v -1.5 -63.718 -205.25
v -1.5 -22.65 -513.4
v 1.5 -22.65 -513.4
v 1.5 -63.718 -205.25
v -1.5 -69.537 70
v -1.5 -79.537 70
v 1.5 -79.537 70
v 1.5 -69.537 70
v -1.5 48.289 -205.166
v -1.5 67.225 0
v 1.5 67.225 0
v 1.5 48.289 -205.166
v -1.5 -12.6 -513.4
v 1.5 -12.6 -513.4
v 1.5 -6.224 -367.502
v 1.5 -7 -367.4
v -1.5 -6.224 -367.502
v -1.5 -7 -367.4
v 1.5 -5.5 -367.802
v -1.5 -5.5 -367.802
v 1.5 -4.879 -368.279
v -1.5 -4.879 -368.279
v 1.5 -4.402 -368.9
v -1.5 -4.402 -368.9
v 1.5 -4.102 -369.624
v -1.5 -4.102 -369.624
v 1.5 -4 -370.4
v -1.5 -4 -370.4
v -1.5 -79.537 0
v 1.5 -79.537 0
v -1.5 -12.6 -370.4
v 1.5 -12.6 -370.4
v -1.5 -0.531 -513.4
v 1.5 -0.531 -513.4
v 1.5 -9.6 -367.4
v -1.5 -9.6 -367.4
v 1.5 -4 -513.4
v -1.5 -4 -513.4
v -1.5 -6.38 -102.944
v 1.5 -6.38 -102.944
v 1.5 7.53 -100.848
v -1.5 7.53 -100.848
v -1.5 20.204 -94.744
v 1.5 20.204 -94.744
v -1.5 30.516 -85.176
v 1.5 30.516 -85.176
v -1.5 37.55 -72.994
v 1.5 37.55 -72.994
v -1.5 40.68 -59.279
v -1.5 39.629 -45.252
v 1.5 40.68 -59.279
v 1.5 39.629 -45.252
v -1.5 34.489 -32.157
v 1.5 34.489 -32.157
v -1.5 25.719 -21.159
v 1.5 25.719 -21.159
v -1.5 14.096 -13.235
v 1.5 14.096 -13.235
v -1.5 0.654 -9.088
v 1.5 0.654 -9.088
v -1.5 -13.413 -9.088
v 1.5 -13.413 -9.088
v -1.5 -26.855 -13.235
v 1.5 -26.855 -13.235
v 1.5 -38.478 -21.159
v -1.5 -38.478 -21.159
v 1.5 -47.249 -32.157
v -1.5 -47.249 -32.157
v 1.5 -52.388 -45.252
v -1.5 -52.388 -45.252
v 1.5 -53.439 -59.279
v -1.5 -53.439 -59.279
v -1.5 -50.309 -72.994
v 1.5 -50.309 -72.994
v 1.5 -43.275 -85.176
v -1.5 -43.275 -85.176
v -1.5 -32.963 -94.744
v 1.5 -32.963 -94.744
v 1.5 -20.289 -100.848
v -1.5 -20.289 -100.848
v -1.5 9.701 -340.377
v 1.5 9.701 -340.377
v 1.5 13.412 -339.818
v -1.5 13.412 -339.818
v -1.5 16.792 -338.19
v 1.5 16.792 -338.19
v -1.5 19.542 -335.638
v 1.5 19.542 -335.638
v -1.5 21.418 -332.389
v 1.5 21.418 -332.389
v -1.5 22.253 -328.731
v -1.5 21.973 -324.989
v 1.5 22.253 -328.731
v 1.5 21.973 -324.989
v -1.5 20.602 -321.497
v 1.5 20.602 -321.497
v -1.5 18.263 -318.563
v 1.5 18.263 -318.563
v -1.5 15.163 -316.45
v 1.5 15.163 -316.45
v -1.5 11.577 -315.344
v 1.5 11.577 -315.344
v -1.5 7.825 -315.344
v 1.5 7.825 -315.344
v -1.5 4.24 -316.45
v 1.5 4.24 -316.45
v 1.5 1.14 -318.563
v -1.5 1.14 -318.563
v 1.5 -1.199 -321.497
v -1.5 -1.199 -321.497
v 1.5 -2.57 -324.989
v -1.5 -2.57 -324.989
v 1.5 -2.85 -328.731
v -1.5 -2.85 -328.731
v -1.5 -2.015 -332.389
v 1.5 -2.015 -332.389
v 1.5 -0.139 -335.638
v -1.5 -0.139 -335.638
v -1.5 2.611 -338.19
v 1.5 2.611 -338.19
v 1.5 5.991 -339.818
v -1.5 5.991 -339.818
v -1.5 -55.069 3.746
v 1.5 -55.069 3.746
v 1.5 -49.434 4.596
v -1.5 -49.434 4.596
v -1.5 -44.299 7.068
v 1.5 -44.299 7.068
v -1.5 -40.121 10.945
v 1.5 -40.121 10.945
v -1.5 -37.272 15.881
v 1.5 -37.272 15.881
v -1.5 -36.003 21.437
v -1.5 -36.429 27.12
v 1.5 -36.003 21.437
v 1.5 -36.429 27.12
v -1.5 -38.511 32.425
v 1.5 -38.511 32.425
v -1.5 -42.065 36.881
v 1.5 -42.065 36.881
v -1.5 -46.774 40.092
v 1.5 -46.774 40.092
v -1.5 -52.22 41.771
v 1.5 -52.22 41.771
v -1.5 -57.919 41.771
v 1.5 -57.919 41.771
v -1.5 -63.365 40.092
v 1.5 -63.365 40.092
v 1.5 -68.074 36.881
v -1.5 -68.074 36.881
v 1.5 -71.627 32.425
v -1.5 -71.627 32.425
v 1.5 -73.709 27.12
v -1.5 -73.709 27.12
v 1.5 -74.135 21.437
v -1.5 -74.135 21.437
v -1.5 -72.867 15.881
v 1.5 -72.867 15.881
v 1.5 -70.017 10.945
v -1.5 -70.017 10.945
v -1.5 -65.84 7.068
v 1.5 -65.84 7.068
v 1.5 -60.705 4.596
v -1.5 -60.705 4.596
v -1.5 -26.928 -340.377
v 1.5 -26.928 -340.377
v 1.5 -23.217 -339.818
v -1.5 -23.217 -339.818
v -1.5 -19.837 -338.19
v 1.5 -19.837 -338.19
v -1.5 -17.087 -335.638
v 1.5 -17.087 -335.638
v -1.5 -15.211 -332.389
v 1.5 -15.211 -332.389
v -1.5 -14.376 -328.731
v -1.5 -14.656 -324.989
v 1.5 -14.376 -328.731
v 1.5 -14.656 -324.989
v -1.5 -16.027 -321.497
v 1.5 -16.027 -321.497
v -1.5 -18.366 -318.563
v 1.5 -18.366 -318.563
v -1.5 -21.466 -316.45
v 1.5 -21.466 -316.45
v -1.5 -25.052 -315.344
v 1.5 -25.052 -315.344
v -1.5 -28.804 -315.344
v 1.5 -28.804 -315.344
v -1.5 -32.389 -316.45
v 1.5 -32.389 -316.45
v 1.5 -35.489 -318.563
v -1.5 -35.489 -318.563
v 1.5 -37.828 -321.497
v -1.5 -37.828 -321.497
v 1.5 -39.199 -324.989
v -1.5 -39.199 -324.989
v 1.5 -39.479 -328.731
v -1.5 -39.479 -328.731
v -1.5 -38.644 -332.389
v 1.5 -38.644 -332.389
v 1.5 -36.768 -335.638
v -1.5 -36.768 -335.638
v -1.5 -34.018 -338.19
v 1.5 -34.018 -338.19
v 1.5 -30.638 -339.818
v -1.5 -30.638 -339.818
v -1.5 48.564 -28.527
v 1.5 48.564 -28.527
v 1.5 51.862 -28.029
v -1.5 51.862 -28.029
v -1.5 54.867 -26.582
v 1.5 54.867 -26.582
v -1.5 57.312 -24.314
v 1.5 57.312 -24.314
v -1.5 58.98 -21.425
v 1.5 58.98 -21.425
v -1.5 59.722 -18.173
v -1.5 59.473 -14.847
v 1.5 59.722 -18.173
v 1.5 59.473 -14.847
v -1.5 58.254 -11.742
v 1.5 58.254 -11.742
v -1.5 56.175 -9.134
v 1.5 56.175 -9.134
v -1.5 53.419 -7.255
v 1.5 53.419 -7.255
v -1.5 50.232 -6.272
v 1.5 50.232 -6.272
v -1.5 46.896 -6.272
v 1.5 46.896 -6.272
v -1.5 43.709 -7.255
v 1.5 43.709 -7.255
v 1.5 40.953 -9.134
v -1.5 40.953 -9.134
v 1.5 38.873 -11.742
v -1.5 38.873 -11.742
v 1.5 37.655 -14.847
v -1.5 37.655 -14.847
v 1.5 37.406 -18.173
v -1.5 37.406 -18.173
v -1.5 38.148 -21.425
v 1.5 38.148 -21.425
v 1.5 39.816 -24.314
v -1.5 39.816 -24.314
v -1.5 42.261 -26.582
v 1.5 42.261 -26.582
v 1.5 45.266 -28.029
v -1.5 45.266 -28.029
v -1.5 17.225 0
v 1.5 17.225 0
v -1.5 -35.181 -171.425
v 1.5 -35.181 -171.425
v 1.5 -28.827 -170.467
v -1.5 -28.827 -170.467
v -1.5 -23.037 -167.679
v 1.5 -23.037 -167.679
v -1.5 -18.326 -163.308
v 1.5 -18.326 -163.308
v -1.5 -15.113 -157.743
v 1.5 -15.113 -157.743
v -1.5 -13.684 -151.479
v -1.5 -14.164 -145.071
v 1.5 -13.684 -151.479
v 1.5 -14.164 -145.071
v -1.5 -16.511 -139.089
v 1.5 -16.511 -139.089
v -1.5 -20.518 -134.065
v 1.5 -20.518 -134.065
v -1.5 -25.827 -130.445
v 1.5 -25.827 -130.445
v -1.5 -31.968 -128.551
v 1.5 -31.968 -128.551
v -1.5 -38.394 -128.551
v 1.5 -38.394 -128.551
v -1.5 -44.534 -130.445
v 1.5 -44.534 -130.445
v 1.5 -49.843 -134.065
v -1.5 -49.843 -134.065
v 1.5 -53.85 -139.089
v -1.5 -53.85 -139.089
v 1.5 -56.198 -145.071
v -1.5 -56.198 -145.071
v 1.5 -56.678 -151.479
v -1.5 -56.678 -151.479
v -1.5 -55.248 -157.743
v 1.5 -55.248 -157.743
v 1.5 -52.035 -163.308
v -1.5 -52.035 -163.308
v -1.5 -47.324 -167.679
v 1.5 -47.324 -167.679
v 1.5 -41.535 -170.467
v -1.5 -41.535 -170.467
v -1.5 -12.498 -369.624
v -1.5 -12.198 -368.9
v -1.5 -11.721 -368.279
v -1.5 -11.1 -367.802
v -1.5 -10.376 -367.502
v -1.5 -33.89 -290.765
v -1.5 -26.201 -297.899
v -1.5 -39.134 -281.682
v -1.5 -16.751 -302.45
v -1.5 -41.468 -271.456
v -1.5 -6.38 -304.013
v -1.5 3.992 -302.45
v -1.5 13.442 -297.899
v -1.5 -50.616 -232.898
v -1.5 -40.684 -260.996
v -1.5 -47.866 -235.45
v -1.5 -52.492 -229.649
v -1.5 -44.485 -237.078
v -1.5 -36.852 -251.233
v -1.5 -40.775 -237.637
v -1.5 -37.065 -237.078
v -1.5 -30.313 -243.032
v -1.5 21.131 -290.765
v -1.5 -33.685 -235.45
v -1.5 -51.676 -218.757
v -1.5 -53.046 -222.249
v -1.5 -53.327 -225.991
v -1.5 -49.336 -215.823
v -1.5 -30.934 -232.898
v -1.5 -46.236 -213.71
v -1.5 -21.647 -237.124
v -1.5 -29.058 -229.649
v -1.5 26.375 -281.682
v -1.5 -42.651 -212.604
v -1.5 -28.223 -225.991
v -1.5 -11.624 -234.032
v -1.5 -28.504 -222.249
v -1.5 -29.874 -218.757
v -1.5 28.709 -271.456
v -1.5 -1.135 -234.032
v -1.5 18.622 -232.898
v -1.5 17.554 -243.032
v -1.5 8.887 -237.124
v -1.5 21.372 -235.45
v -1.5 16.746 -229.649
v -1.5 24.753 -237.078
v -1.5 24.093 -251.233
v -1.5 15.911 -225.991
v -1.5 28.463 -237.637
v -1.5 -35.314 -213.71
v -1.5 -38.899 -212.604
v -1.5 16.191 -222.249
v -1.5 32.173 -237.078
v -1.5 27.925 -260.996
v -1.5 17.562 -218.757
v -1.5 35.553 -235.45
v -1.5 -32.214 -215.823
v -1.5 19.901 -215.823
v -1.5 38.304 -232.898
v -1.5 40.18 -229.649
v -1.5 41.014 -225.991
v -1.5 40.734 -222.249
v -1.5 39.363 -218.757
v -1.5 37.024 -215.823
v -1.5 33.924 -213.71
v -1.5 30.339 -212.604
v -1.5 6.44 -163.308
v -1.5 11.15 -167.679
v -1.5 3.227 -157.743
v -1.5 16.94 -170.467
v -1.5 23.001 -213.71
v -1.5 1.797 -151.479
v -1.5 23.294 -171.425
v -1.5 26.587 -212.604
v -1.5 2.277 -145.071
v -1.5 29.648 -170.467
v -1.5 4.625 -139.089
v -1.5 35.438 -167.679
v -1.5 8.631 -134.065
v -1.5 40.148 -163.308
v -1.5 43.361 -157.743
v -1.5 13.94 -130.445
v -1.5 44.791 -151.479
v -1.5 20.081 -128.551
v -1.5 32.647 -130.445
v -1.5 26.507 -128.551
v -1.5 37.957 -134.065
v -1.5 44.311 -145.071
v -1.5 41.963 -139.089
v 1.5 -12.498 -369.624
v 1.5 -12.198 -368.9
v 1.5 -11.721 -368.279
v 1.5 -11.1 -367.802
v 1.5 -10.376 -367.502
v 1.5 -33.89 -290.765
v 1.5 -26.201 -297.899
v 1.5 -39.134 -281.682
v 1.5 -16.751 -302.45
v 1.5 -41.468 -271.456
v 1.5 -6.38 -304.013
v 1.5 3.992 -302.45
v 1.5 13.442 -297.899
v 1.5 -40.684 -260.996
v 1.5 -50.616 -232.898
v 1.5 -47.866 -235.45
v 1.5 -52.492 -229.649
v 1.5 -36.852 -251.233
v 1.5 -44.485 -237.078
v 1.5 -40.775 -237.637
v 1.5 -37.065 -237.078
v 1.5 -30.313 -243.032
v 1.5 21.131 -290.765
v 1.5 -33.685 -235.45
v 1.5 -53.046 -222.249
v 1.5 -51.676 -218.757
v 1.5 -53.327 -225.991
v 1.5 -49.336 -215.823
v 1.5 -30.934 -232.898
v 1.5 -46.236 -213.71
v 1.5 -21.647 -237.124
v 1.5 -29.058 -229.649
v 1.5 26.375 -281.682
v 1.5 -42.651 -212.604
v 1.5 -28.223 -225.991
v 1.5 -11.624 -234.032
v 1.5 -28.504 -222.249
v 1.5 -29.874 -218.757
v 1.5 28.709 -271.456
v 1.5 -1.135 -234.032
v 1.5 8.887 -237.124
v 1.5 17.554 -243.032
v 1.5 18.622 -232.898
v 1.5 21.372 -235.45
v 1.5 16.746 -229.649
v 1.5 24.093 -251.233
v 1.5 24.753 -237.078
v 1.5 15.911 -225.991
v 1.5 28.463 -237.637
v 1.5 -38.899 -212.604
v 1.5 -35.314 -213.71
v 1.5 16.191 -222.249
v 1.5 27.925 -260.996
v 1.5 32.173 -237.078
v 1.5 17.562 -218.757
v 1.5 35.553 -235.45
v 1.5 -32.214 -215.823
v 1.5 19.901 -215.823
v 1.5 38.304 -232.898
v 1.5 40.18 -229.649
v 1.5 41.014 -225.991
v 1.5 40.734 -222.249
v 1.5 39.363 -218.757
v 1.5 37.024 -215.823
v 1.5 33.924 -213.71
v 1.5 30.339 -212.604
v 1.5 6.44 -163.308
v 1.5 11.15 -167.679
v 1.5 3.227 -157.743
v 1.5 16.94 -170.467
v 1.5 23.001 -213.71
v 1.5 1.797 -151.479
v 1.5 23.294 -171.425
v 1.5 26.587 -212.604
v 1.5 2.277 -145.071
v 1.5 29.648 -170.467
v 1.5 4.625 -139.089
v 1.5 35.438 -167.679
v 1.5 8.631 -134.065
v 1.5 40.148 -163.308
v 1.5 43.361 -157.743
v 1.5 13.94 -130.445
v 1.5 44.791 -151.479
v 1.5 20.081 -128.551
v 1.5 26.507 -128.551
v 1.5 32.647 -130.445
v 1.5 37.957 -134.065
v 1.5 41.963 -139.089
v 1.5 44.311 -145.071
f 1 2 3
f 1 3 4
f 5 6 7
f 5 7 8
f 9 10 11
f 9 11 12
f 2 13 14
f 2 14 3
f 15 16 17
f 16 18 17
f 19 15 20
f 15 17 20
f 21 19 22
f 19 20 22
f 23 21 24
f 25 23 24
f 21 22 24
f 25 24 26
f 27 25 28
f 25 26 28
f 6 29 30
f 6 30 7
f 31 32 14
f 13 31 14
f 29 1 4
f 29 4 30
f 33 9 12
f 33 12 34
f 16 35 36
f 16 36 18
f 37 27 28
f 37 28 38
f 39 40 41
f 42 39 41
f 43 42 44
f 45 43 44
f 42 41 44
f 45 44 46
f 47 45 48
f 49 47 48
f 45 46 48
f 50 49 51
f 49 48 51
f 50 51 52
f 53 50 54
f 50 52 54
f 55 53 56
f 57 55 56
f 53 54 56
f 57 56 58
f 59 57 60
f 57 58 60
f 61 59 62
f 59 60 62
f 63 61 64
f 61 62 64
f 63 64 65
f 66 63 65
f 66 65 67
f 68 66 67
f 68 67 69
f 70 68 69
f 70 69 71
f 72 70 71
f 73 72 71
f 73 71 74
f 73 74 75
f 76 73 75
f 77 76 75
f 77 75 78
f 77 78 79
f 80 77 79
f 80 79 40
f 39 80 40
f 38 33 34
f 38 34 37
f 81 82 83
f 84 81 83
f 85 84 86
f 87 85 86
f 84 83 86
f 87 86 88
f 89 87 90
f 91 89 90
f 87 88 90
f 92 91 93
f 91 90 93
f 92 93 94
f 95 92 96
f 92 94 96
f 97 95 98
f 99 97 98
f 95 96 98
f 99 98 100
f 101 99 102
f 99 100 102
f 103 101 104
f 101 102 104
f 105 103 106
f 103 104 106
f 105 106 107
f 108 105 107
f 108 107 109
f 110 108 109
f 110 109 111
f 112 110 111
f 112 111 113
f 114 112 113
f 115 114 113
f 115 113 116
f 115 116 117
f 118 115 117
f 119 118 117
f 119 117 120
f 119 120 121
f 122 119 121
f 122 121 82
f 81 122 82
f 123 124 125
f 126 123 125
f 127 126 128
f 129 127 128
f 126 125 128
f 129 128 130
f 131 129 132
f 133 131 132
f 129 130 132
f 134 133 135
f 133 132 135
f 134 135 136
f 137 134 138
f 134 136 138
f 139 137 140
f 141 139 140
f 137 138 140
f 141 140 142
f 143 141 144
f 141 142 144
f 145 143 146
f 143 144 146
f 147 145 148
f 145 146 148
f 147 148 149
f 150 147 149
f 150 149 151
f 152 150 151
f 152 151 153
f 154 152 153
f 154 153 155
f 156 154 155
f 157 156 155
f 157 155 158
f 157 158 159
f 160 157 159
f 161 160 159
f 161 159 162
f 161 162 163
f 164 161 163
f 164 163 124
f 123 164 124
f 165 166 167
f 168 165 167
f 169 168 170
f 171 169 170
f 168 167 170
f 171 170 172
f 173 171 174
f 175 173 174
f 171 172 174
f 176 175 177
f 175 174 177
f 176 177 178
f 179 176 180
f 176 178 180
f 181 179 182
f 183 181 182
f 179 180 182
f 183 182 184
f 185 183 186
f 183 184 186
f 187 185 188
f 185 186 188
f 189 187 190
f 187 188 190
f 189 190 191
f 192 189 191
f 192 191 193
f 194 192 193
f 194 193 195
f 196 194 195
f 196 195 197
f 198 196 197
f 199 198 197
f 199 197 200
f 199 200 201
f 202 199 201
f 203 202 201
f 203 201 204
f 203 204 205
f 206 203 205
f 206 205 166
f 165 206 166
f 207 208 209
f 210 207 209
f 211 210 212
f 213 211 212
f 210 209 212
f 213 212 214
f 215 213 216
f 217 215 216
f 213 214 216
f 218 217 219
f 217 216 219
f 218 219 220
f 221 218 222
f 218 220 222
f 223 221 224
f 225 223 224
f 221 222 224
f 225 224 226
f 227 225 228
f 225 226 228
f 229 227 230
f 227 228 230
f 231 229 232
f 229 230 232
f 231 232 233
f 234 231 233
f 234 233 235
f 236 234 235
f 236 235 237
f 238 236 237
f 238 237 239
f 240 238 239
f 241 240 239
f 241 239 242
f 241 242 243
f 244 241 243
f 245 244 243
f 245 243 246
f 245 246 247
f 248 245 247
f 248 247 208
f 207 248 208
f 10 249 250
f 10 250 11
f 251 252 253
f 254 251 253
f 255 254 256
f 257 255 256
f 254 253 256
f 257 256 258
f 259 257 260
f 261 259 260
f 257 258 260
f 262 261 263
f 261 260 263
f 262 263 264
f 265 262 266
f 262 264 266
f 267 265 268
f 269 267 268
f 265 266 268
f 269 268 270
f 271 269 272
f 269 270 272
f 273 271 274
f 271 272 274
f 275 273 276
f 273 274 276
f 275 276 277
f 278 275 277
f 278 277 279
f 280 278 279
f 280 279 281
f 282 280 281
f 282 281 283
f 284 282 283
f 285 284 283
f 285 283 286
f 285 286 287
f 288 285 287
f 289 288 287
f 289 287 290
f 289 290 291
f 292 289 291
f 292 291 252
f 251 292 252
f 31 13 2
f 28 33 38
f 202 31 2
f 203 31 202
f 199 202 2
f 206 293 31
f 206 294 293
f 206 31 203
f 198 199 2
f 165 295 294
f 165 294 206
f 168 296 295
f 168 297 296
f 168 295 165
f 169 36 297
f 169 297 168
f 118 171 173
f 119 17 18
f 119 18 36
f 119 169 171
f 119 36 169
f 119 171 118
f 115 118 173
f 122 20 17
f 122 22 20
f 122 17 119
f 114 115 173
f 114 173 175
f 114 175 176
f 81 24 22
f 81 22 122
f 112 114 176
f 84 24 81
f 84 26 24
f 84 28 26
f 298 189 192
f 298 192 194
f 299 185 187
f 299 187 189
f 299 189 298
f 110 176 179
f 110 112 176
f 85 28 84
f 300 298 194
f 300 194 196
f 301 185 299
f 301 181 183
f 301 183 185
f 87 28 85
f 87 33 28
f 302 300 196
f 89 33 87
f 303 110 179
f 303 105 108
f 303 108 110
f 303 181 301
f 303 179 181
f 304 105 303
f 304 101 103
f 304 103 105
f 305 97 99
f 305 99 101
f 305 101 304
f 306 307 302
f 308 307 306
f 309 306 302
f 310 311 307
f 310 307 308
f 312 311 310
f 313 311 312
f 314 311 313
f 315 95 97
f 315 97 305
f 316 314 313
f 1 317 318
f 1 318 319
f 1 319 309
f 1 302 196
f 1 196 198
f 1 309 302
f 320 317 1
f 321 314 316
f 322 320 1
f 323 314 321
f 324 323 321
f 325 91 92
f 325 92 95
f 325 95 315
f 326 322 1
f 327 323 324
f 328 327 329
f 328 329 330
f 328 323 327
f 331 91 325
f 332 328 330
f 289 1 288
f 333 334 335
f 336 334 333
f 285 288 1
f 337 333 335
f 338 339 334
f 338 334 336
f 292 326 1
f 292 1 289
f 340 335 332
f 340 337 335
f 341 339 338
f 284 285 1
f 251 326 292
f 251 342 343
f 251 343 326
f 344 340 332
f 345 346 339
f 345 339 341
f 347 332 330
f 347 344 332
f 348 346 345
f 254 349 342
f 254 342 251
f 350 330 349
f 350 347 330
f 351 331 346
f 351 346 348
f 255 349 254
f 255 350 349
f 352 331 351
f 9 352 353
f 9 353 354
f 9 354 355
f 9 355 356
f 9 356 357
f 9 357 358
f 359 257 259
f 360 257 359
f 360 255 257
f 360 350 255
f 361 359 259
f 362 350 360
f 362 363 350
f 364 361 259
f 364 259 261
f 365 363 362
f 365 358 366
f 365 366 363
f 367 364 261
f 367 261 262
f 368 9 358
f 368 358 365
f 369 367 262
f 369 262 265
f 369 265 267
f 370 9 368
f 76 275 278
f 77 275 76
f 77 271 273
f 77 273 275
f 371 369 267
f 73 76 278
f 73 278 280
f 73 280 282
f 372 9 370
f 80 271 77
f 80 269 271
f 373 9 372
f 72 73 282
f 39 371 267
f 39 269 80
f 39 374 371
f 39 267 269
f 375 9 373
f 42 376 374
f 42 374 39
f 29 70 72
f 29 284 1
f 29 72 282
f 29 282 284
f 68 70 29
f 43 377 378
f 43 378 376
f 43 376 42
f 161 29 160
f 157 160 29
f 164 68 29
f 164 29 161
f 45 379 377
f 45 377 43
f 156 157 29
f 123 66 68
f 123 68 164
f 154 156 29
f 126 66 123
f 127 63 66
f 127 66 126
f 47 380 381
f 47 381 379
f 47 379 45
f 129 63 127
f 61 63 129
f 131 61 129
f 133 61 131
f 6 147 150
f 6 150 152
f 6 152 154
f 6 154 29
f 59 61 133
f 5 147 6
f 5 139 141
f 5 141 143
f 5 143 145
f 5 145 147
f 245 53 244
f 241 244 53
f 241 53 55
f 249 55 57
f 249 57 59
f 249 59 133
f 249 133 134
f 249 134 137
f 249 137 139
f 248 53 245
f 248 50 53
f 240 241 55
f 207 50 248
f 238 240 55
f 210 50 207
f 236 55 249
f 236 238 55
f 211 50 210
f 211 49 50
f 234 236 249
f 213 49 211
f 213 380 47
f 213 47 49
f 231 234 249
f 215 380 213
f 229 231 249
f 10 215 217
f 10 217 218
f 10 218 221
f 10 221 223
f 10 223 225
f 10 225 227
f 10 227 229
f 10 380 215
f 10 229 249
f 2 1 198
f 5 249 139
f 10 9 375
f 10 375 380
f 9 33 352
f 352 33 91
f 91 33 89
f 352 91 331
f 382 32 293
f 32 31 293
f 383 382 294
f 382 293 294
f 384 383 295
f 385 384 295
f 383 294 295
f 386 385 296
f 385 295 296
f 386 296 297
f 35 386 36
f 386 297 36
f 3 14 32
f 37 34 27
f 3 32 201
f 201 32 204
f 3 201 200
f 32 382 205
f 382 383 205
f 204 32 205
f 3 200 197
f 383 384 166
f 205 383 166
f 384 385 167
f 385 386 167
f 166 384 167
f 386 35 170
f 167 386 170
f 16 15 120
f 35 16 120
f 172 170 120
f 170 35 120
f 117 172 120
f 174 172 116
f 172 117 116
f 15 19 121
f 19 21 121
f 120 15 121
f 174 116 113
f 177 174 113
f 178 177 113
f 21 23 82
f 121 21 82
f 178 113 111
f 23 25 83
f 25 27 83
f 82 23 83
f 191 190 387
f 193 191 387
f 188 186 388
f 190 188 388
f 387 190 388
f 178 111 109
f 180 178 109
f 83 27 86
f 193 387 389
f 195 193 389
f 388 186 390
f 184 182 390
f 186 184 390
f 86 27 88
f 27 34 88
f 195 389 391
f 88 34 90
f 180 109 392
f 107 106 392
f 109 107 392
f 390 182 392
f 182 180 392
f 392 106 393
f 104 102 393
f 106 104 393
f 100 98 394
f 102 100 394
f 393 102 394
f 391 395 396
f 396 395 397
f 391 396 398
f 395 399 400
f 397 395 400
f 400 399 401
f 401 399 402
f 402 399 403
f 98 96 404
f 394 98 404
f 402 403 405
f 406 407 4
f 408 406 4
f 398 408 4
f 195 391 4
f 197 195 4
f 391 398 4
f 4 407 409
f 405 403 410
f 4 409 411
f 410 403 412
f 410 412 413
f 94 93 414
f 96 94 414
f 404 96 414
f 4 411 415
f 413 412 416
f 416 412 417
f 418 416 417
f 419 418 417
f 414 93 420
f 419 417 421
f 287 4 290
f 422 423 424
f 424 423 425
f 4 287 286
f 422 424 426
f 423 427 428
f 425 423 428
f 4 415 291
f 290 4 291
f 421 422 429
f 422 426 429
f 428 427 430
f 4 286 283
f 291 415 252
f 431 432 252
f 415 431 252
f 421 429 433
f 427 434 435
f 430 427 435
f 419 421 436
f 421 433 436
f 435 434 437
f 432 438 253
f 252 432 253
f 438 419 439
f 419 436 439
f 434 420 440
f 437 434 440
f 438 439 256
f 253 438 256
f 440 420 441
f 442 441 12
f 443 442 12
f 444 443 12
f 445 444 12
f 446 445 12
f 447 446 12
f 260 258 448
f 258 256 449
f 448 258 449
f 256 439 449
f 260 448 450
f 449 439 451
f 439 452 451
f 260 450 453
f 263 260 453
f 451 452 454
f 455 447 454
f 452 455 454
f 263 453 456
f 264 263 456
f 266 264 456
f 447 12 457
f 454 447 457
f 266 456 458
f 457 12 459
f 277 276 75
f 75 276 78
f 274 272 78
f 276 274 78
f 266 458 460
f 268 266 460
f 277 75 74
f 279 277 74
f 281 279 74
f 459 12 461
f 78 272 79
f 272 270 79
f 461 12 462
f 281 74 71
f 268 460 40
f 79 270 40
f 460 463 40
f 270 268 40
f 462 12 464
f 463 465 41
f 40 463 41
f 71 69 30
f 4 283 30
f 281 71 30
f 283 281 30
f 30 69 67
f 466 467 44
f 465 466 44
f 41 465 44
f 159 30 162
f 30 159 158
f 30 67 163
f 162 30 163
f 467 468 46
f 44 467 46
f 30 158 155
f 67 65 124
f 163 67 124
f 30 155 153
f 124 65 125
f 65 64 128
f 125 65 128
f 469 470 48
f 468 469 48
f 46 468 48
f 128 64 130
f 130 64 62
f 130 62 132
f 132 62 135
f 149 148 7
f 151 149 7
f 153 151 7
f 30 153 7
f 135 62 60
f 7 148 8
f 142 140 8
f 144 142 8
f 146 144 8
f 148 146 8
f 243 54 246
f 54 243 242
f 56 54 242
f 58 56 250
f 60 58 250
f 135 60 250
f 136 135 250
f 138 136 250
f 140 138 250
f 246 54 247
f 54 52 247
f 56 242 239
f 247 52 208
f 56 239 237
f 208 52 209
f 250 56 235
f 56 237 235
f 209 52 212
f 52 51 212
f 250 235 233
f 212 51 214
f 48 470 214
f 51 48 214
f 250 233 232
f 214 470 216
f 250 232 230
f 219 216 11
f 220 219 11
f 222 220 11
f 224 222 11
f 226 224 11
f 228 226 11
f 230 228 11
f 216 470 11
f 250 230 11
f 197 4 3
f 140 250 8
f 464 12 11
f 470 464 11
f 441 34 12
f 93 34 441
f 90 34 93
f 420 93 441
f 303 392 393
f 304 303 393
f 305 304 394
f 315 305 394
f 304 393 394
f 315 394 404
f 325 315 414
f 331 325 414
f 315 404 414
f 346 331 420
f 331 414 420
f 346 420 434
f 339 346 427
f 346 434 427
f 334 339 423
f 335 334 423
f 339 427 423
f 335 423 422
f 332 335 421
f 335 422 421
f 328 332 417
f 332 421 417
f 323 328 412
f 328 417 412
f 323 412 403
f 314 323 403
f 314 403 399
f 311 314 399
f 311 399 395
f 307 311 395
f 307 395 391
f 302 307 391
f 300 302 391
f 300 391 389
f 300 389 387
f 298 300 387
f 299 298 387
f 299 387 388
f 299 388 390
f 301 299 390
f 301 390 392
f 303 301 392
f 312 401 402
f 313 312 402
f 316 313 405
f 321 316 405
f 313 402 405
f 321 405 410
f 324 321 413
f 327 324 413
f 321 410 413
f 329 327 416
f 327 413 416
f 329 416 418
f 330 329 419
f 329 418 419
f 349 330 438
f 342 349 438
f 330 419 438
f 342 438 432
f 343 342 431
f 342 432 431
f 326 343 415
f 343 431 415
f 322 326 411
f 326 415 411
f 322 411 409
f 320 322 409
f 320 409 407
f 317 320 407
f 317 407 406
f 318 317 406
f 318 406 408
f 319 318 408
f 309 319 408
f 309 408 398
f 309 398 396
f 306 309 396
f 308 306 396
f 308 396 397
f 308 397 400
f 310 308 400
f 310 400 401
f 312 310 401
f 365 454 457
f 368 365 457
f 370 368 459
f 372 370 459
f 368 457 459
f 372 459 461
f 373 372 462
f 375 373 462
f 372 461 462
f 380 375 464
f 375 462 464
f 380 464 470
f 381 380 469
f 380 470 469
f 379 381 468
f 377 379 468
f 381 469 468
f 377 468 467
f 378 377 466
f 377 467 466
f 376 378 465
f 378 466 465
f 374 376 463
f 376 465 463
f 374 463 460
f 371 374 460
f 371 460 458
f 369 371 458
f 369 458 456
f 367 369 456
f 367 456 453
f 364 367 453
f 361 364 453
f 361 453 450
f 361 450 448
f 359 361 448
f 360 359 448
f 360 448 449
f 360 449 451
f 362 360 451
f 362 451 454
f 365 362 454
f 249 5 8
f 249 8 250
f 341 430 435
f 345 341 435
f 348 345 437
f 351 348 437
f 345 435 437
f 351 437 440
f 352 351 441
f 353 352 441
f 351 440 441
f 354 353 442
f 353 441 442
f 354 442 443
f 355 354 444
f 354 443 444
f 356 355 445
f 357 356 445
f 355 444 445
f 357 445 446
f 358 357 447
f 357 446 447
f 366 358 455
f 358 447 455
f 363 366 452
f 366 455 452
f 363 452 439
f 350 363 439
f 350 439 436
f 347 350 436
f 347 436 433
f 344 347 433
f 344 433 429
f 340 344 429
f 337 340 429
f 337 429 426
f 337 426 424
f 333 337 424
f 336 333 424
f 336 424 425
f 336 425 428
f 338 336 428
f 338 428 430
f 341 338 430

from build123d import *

# Parameters (mm, degrees)
BOSS_EXTRUDE1_DEPTH      = 1.5
BOSS_EXTRUDE1_DEPTH_BACK = 1.5
SKETCH3_W                = 152
SKETCH3_H                = 8.6
CUT_EXTRUDE1_DEPTH       = 520.533194562
FILLET1_R                = 3
SKETCH4_R                = 19.119387796
SKETCH4_R_2              = 47.191393473
SKETCH4_R_3              = 35.18699184
SKETCH4_R_4              = 12.586978738
SKETCH4_R_5              = 11.189603354
SKETCH4_R_6              = 21.557380713
CUT_EXTRUDE2_DEPTH       = 10


with BuildPart() as part:
    # Sketch2 → Boss-Extrude1 (new, two sides: drawn at the far end of the back side and taken through both)
    with BuildSketch(Plane(origin=(0, 0, 0), x_dir=(0, 0, -1), z_dir=(1, 0, 0)).offset(-BOSS_EXTRUDE1_DEPTH_BACK)):
        Polygon((0, 67.22485033), (205.165503831, 48.288859026), (513.4, -0.530689138), (513.4, -22.650154351), (205.250409944, -63.717607751), (0, -79.537288439), (-70, -79.537288439), (-70, -69.537288439), (0, 17.22485033), align=None)
    extrude(amount=BOSS_EXTRUDE1_DEPTH + BOSS_EXTRUDE1_DEPTH_BACK)

    # Sketch3 → Cut-Extrude1 (cut, through all)
    with BuildSketch(Plane(origin=(1.5, 0, 0), x_dir=(0, 0, -1), z_dir=(1, 0, 0))):
        with Locations((443.4, -8.3)):
            Rectangle(SKETCH3_W, SKETCH3_H)
    extrude(amount=-CUT_EXTRUDE1_DEPTH, mode=Mode.SUBTRACT)

    # Fillet1
    fillet1_edges = [part.edges().sort_by_distance(p)[0] for p in [
        (0, -12.6, -367.4),
        (0, -4, -367.4),
    ]]
    fillet(fillet1_edges, radius=FILLET1_R)

    # Sketch4 → Cut-Extrude2 (cut)
    with BuildSketch(Plane(origin=(1.5, 0, 0), x_dir=(0, 0, -1), z_dir=(1, 0, 0))):
        with Locations((-22.865600385, -55.069339131)):
            Circle(SKETCH4_R)
        with Locations((55.752747866, -6.379566635)):
            Circle(SKETCH4_R_2)
        with Locations((268.826339435, -6.379566635)):
            Circle(SKETCH4_R_3)
        with Locations((225.050213704, 28.462655886)):
            Circle(SKETCH4_R_4)
        with Locations((17.336964062, 48.563938109)):
            Circle(SKETCH4_R_5)
        with Locations((225.050213704, -40.775093995)):
            Circle(SKETCH4_R_4)
        with Locations((327.790100624, -26.927544019)):
            Circle(SKETCH4_R_4)
        with Locations((327.790100624, 9.701459144)):
            Circle(SKETCH4_R_4)
        with Locations((149.867646424, 23.293890716)):
            Circle(SKETCH4_R_6)
        with Locations((149.867646424, -35.180680846)):
            Circle(SKETCH4_R_6)
    extrude(amount=-CUT_EXTRUDE2_DEPTH, mode=Mode.SUBTRACT)


solid = part.part
